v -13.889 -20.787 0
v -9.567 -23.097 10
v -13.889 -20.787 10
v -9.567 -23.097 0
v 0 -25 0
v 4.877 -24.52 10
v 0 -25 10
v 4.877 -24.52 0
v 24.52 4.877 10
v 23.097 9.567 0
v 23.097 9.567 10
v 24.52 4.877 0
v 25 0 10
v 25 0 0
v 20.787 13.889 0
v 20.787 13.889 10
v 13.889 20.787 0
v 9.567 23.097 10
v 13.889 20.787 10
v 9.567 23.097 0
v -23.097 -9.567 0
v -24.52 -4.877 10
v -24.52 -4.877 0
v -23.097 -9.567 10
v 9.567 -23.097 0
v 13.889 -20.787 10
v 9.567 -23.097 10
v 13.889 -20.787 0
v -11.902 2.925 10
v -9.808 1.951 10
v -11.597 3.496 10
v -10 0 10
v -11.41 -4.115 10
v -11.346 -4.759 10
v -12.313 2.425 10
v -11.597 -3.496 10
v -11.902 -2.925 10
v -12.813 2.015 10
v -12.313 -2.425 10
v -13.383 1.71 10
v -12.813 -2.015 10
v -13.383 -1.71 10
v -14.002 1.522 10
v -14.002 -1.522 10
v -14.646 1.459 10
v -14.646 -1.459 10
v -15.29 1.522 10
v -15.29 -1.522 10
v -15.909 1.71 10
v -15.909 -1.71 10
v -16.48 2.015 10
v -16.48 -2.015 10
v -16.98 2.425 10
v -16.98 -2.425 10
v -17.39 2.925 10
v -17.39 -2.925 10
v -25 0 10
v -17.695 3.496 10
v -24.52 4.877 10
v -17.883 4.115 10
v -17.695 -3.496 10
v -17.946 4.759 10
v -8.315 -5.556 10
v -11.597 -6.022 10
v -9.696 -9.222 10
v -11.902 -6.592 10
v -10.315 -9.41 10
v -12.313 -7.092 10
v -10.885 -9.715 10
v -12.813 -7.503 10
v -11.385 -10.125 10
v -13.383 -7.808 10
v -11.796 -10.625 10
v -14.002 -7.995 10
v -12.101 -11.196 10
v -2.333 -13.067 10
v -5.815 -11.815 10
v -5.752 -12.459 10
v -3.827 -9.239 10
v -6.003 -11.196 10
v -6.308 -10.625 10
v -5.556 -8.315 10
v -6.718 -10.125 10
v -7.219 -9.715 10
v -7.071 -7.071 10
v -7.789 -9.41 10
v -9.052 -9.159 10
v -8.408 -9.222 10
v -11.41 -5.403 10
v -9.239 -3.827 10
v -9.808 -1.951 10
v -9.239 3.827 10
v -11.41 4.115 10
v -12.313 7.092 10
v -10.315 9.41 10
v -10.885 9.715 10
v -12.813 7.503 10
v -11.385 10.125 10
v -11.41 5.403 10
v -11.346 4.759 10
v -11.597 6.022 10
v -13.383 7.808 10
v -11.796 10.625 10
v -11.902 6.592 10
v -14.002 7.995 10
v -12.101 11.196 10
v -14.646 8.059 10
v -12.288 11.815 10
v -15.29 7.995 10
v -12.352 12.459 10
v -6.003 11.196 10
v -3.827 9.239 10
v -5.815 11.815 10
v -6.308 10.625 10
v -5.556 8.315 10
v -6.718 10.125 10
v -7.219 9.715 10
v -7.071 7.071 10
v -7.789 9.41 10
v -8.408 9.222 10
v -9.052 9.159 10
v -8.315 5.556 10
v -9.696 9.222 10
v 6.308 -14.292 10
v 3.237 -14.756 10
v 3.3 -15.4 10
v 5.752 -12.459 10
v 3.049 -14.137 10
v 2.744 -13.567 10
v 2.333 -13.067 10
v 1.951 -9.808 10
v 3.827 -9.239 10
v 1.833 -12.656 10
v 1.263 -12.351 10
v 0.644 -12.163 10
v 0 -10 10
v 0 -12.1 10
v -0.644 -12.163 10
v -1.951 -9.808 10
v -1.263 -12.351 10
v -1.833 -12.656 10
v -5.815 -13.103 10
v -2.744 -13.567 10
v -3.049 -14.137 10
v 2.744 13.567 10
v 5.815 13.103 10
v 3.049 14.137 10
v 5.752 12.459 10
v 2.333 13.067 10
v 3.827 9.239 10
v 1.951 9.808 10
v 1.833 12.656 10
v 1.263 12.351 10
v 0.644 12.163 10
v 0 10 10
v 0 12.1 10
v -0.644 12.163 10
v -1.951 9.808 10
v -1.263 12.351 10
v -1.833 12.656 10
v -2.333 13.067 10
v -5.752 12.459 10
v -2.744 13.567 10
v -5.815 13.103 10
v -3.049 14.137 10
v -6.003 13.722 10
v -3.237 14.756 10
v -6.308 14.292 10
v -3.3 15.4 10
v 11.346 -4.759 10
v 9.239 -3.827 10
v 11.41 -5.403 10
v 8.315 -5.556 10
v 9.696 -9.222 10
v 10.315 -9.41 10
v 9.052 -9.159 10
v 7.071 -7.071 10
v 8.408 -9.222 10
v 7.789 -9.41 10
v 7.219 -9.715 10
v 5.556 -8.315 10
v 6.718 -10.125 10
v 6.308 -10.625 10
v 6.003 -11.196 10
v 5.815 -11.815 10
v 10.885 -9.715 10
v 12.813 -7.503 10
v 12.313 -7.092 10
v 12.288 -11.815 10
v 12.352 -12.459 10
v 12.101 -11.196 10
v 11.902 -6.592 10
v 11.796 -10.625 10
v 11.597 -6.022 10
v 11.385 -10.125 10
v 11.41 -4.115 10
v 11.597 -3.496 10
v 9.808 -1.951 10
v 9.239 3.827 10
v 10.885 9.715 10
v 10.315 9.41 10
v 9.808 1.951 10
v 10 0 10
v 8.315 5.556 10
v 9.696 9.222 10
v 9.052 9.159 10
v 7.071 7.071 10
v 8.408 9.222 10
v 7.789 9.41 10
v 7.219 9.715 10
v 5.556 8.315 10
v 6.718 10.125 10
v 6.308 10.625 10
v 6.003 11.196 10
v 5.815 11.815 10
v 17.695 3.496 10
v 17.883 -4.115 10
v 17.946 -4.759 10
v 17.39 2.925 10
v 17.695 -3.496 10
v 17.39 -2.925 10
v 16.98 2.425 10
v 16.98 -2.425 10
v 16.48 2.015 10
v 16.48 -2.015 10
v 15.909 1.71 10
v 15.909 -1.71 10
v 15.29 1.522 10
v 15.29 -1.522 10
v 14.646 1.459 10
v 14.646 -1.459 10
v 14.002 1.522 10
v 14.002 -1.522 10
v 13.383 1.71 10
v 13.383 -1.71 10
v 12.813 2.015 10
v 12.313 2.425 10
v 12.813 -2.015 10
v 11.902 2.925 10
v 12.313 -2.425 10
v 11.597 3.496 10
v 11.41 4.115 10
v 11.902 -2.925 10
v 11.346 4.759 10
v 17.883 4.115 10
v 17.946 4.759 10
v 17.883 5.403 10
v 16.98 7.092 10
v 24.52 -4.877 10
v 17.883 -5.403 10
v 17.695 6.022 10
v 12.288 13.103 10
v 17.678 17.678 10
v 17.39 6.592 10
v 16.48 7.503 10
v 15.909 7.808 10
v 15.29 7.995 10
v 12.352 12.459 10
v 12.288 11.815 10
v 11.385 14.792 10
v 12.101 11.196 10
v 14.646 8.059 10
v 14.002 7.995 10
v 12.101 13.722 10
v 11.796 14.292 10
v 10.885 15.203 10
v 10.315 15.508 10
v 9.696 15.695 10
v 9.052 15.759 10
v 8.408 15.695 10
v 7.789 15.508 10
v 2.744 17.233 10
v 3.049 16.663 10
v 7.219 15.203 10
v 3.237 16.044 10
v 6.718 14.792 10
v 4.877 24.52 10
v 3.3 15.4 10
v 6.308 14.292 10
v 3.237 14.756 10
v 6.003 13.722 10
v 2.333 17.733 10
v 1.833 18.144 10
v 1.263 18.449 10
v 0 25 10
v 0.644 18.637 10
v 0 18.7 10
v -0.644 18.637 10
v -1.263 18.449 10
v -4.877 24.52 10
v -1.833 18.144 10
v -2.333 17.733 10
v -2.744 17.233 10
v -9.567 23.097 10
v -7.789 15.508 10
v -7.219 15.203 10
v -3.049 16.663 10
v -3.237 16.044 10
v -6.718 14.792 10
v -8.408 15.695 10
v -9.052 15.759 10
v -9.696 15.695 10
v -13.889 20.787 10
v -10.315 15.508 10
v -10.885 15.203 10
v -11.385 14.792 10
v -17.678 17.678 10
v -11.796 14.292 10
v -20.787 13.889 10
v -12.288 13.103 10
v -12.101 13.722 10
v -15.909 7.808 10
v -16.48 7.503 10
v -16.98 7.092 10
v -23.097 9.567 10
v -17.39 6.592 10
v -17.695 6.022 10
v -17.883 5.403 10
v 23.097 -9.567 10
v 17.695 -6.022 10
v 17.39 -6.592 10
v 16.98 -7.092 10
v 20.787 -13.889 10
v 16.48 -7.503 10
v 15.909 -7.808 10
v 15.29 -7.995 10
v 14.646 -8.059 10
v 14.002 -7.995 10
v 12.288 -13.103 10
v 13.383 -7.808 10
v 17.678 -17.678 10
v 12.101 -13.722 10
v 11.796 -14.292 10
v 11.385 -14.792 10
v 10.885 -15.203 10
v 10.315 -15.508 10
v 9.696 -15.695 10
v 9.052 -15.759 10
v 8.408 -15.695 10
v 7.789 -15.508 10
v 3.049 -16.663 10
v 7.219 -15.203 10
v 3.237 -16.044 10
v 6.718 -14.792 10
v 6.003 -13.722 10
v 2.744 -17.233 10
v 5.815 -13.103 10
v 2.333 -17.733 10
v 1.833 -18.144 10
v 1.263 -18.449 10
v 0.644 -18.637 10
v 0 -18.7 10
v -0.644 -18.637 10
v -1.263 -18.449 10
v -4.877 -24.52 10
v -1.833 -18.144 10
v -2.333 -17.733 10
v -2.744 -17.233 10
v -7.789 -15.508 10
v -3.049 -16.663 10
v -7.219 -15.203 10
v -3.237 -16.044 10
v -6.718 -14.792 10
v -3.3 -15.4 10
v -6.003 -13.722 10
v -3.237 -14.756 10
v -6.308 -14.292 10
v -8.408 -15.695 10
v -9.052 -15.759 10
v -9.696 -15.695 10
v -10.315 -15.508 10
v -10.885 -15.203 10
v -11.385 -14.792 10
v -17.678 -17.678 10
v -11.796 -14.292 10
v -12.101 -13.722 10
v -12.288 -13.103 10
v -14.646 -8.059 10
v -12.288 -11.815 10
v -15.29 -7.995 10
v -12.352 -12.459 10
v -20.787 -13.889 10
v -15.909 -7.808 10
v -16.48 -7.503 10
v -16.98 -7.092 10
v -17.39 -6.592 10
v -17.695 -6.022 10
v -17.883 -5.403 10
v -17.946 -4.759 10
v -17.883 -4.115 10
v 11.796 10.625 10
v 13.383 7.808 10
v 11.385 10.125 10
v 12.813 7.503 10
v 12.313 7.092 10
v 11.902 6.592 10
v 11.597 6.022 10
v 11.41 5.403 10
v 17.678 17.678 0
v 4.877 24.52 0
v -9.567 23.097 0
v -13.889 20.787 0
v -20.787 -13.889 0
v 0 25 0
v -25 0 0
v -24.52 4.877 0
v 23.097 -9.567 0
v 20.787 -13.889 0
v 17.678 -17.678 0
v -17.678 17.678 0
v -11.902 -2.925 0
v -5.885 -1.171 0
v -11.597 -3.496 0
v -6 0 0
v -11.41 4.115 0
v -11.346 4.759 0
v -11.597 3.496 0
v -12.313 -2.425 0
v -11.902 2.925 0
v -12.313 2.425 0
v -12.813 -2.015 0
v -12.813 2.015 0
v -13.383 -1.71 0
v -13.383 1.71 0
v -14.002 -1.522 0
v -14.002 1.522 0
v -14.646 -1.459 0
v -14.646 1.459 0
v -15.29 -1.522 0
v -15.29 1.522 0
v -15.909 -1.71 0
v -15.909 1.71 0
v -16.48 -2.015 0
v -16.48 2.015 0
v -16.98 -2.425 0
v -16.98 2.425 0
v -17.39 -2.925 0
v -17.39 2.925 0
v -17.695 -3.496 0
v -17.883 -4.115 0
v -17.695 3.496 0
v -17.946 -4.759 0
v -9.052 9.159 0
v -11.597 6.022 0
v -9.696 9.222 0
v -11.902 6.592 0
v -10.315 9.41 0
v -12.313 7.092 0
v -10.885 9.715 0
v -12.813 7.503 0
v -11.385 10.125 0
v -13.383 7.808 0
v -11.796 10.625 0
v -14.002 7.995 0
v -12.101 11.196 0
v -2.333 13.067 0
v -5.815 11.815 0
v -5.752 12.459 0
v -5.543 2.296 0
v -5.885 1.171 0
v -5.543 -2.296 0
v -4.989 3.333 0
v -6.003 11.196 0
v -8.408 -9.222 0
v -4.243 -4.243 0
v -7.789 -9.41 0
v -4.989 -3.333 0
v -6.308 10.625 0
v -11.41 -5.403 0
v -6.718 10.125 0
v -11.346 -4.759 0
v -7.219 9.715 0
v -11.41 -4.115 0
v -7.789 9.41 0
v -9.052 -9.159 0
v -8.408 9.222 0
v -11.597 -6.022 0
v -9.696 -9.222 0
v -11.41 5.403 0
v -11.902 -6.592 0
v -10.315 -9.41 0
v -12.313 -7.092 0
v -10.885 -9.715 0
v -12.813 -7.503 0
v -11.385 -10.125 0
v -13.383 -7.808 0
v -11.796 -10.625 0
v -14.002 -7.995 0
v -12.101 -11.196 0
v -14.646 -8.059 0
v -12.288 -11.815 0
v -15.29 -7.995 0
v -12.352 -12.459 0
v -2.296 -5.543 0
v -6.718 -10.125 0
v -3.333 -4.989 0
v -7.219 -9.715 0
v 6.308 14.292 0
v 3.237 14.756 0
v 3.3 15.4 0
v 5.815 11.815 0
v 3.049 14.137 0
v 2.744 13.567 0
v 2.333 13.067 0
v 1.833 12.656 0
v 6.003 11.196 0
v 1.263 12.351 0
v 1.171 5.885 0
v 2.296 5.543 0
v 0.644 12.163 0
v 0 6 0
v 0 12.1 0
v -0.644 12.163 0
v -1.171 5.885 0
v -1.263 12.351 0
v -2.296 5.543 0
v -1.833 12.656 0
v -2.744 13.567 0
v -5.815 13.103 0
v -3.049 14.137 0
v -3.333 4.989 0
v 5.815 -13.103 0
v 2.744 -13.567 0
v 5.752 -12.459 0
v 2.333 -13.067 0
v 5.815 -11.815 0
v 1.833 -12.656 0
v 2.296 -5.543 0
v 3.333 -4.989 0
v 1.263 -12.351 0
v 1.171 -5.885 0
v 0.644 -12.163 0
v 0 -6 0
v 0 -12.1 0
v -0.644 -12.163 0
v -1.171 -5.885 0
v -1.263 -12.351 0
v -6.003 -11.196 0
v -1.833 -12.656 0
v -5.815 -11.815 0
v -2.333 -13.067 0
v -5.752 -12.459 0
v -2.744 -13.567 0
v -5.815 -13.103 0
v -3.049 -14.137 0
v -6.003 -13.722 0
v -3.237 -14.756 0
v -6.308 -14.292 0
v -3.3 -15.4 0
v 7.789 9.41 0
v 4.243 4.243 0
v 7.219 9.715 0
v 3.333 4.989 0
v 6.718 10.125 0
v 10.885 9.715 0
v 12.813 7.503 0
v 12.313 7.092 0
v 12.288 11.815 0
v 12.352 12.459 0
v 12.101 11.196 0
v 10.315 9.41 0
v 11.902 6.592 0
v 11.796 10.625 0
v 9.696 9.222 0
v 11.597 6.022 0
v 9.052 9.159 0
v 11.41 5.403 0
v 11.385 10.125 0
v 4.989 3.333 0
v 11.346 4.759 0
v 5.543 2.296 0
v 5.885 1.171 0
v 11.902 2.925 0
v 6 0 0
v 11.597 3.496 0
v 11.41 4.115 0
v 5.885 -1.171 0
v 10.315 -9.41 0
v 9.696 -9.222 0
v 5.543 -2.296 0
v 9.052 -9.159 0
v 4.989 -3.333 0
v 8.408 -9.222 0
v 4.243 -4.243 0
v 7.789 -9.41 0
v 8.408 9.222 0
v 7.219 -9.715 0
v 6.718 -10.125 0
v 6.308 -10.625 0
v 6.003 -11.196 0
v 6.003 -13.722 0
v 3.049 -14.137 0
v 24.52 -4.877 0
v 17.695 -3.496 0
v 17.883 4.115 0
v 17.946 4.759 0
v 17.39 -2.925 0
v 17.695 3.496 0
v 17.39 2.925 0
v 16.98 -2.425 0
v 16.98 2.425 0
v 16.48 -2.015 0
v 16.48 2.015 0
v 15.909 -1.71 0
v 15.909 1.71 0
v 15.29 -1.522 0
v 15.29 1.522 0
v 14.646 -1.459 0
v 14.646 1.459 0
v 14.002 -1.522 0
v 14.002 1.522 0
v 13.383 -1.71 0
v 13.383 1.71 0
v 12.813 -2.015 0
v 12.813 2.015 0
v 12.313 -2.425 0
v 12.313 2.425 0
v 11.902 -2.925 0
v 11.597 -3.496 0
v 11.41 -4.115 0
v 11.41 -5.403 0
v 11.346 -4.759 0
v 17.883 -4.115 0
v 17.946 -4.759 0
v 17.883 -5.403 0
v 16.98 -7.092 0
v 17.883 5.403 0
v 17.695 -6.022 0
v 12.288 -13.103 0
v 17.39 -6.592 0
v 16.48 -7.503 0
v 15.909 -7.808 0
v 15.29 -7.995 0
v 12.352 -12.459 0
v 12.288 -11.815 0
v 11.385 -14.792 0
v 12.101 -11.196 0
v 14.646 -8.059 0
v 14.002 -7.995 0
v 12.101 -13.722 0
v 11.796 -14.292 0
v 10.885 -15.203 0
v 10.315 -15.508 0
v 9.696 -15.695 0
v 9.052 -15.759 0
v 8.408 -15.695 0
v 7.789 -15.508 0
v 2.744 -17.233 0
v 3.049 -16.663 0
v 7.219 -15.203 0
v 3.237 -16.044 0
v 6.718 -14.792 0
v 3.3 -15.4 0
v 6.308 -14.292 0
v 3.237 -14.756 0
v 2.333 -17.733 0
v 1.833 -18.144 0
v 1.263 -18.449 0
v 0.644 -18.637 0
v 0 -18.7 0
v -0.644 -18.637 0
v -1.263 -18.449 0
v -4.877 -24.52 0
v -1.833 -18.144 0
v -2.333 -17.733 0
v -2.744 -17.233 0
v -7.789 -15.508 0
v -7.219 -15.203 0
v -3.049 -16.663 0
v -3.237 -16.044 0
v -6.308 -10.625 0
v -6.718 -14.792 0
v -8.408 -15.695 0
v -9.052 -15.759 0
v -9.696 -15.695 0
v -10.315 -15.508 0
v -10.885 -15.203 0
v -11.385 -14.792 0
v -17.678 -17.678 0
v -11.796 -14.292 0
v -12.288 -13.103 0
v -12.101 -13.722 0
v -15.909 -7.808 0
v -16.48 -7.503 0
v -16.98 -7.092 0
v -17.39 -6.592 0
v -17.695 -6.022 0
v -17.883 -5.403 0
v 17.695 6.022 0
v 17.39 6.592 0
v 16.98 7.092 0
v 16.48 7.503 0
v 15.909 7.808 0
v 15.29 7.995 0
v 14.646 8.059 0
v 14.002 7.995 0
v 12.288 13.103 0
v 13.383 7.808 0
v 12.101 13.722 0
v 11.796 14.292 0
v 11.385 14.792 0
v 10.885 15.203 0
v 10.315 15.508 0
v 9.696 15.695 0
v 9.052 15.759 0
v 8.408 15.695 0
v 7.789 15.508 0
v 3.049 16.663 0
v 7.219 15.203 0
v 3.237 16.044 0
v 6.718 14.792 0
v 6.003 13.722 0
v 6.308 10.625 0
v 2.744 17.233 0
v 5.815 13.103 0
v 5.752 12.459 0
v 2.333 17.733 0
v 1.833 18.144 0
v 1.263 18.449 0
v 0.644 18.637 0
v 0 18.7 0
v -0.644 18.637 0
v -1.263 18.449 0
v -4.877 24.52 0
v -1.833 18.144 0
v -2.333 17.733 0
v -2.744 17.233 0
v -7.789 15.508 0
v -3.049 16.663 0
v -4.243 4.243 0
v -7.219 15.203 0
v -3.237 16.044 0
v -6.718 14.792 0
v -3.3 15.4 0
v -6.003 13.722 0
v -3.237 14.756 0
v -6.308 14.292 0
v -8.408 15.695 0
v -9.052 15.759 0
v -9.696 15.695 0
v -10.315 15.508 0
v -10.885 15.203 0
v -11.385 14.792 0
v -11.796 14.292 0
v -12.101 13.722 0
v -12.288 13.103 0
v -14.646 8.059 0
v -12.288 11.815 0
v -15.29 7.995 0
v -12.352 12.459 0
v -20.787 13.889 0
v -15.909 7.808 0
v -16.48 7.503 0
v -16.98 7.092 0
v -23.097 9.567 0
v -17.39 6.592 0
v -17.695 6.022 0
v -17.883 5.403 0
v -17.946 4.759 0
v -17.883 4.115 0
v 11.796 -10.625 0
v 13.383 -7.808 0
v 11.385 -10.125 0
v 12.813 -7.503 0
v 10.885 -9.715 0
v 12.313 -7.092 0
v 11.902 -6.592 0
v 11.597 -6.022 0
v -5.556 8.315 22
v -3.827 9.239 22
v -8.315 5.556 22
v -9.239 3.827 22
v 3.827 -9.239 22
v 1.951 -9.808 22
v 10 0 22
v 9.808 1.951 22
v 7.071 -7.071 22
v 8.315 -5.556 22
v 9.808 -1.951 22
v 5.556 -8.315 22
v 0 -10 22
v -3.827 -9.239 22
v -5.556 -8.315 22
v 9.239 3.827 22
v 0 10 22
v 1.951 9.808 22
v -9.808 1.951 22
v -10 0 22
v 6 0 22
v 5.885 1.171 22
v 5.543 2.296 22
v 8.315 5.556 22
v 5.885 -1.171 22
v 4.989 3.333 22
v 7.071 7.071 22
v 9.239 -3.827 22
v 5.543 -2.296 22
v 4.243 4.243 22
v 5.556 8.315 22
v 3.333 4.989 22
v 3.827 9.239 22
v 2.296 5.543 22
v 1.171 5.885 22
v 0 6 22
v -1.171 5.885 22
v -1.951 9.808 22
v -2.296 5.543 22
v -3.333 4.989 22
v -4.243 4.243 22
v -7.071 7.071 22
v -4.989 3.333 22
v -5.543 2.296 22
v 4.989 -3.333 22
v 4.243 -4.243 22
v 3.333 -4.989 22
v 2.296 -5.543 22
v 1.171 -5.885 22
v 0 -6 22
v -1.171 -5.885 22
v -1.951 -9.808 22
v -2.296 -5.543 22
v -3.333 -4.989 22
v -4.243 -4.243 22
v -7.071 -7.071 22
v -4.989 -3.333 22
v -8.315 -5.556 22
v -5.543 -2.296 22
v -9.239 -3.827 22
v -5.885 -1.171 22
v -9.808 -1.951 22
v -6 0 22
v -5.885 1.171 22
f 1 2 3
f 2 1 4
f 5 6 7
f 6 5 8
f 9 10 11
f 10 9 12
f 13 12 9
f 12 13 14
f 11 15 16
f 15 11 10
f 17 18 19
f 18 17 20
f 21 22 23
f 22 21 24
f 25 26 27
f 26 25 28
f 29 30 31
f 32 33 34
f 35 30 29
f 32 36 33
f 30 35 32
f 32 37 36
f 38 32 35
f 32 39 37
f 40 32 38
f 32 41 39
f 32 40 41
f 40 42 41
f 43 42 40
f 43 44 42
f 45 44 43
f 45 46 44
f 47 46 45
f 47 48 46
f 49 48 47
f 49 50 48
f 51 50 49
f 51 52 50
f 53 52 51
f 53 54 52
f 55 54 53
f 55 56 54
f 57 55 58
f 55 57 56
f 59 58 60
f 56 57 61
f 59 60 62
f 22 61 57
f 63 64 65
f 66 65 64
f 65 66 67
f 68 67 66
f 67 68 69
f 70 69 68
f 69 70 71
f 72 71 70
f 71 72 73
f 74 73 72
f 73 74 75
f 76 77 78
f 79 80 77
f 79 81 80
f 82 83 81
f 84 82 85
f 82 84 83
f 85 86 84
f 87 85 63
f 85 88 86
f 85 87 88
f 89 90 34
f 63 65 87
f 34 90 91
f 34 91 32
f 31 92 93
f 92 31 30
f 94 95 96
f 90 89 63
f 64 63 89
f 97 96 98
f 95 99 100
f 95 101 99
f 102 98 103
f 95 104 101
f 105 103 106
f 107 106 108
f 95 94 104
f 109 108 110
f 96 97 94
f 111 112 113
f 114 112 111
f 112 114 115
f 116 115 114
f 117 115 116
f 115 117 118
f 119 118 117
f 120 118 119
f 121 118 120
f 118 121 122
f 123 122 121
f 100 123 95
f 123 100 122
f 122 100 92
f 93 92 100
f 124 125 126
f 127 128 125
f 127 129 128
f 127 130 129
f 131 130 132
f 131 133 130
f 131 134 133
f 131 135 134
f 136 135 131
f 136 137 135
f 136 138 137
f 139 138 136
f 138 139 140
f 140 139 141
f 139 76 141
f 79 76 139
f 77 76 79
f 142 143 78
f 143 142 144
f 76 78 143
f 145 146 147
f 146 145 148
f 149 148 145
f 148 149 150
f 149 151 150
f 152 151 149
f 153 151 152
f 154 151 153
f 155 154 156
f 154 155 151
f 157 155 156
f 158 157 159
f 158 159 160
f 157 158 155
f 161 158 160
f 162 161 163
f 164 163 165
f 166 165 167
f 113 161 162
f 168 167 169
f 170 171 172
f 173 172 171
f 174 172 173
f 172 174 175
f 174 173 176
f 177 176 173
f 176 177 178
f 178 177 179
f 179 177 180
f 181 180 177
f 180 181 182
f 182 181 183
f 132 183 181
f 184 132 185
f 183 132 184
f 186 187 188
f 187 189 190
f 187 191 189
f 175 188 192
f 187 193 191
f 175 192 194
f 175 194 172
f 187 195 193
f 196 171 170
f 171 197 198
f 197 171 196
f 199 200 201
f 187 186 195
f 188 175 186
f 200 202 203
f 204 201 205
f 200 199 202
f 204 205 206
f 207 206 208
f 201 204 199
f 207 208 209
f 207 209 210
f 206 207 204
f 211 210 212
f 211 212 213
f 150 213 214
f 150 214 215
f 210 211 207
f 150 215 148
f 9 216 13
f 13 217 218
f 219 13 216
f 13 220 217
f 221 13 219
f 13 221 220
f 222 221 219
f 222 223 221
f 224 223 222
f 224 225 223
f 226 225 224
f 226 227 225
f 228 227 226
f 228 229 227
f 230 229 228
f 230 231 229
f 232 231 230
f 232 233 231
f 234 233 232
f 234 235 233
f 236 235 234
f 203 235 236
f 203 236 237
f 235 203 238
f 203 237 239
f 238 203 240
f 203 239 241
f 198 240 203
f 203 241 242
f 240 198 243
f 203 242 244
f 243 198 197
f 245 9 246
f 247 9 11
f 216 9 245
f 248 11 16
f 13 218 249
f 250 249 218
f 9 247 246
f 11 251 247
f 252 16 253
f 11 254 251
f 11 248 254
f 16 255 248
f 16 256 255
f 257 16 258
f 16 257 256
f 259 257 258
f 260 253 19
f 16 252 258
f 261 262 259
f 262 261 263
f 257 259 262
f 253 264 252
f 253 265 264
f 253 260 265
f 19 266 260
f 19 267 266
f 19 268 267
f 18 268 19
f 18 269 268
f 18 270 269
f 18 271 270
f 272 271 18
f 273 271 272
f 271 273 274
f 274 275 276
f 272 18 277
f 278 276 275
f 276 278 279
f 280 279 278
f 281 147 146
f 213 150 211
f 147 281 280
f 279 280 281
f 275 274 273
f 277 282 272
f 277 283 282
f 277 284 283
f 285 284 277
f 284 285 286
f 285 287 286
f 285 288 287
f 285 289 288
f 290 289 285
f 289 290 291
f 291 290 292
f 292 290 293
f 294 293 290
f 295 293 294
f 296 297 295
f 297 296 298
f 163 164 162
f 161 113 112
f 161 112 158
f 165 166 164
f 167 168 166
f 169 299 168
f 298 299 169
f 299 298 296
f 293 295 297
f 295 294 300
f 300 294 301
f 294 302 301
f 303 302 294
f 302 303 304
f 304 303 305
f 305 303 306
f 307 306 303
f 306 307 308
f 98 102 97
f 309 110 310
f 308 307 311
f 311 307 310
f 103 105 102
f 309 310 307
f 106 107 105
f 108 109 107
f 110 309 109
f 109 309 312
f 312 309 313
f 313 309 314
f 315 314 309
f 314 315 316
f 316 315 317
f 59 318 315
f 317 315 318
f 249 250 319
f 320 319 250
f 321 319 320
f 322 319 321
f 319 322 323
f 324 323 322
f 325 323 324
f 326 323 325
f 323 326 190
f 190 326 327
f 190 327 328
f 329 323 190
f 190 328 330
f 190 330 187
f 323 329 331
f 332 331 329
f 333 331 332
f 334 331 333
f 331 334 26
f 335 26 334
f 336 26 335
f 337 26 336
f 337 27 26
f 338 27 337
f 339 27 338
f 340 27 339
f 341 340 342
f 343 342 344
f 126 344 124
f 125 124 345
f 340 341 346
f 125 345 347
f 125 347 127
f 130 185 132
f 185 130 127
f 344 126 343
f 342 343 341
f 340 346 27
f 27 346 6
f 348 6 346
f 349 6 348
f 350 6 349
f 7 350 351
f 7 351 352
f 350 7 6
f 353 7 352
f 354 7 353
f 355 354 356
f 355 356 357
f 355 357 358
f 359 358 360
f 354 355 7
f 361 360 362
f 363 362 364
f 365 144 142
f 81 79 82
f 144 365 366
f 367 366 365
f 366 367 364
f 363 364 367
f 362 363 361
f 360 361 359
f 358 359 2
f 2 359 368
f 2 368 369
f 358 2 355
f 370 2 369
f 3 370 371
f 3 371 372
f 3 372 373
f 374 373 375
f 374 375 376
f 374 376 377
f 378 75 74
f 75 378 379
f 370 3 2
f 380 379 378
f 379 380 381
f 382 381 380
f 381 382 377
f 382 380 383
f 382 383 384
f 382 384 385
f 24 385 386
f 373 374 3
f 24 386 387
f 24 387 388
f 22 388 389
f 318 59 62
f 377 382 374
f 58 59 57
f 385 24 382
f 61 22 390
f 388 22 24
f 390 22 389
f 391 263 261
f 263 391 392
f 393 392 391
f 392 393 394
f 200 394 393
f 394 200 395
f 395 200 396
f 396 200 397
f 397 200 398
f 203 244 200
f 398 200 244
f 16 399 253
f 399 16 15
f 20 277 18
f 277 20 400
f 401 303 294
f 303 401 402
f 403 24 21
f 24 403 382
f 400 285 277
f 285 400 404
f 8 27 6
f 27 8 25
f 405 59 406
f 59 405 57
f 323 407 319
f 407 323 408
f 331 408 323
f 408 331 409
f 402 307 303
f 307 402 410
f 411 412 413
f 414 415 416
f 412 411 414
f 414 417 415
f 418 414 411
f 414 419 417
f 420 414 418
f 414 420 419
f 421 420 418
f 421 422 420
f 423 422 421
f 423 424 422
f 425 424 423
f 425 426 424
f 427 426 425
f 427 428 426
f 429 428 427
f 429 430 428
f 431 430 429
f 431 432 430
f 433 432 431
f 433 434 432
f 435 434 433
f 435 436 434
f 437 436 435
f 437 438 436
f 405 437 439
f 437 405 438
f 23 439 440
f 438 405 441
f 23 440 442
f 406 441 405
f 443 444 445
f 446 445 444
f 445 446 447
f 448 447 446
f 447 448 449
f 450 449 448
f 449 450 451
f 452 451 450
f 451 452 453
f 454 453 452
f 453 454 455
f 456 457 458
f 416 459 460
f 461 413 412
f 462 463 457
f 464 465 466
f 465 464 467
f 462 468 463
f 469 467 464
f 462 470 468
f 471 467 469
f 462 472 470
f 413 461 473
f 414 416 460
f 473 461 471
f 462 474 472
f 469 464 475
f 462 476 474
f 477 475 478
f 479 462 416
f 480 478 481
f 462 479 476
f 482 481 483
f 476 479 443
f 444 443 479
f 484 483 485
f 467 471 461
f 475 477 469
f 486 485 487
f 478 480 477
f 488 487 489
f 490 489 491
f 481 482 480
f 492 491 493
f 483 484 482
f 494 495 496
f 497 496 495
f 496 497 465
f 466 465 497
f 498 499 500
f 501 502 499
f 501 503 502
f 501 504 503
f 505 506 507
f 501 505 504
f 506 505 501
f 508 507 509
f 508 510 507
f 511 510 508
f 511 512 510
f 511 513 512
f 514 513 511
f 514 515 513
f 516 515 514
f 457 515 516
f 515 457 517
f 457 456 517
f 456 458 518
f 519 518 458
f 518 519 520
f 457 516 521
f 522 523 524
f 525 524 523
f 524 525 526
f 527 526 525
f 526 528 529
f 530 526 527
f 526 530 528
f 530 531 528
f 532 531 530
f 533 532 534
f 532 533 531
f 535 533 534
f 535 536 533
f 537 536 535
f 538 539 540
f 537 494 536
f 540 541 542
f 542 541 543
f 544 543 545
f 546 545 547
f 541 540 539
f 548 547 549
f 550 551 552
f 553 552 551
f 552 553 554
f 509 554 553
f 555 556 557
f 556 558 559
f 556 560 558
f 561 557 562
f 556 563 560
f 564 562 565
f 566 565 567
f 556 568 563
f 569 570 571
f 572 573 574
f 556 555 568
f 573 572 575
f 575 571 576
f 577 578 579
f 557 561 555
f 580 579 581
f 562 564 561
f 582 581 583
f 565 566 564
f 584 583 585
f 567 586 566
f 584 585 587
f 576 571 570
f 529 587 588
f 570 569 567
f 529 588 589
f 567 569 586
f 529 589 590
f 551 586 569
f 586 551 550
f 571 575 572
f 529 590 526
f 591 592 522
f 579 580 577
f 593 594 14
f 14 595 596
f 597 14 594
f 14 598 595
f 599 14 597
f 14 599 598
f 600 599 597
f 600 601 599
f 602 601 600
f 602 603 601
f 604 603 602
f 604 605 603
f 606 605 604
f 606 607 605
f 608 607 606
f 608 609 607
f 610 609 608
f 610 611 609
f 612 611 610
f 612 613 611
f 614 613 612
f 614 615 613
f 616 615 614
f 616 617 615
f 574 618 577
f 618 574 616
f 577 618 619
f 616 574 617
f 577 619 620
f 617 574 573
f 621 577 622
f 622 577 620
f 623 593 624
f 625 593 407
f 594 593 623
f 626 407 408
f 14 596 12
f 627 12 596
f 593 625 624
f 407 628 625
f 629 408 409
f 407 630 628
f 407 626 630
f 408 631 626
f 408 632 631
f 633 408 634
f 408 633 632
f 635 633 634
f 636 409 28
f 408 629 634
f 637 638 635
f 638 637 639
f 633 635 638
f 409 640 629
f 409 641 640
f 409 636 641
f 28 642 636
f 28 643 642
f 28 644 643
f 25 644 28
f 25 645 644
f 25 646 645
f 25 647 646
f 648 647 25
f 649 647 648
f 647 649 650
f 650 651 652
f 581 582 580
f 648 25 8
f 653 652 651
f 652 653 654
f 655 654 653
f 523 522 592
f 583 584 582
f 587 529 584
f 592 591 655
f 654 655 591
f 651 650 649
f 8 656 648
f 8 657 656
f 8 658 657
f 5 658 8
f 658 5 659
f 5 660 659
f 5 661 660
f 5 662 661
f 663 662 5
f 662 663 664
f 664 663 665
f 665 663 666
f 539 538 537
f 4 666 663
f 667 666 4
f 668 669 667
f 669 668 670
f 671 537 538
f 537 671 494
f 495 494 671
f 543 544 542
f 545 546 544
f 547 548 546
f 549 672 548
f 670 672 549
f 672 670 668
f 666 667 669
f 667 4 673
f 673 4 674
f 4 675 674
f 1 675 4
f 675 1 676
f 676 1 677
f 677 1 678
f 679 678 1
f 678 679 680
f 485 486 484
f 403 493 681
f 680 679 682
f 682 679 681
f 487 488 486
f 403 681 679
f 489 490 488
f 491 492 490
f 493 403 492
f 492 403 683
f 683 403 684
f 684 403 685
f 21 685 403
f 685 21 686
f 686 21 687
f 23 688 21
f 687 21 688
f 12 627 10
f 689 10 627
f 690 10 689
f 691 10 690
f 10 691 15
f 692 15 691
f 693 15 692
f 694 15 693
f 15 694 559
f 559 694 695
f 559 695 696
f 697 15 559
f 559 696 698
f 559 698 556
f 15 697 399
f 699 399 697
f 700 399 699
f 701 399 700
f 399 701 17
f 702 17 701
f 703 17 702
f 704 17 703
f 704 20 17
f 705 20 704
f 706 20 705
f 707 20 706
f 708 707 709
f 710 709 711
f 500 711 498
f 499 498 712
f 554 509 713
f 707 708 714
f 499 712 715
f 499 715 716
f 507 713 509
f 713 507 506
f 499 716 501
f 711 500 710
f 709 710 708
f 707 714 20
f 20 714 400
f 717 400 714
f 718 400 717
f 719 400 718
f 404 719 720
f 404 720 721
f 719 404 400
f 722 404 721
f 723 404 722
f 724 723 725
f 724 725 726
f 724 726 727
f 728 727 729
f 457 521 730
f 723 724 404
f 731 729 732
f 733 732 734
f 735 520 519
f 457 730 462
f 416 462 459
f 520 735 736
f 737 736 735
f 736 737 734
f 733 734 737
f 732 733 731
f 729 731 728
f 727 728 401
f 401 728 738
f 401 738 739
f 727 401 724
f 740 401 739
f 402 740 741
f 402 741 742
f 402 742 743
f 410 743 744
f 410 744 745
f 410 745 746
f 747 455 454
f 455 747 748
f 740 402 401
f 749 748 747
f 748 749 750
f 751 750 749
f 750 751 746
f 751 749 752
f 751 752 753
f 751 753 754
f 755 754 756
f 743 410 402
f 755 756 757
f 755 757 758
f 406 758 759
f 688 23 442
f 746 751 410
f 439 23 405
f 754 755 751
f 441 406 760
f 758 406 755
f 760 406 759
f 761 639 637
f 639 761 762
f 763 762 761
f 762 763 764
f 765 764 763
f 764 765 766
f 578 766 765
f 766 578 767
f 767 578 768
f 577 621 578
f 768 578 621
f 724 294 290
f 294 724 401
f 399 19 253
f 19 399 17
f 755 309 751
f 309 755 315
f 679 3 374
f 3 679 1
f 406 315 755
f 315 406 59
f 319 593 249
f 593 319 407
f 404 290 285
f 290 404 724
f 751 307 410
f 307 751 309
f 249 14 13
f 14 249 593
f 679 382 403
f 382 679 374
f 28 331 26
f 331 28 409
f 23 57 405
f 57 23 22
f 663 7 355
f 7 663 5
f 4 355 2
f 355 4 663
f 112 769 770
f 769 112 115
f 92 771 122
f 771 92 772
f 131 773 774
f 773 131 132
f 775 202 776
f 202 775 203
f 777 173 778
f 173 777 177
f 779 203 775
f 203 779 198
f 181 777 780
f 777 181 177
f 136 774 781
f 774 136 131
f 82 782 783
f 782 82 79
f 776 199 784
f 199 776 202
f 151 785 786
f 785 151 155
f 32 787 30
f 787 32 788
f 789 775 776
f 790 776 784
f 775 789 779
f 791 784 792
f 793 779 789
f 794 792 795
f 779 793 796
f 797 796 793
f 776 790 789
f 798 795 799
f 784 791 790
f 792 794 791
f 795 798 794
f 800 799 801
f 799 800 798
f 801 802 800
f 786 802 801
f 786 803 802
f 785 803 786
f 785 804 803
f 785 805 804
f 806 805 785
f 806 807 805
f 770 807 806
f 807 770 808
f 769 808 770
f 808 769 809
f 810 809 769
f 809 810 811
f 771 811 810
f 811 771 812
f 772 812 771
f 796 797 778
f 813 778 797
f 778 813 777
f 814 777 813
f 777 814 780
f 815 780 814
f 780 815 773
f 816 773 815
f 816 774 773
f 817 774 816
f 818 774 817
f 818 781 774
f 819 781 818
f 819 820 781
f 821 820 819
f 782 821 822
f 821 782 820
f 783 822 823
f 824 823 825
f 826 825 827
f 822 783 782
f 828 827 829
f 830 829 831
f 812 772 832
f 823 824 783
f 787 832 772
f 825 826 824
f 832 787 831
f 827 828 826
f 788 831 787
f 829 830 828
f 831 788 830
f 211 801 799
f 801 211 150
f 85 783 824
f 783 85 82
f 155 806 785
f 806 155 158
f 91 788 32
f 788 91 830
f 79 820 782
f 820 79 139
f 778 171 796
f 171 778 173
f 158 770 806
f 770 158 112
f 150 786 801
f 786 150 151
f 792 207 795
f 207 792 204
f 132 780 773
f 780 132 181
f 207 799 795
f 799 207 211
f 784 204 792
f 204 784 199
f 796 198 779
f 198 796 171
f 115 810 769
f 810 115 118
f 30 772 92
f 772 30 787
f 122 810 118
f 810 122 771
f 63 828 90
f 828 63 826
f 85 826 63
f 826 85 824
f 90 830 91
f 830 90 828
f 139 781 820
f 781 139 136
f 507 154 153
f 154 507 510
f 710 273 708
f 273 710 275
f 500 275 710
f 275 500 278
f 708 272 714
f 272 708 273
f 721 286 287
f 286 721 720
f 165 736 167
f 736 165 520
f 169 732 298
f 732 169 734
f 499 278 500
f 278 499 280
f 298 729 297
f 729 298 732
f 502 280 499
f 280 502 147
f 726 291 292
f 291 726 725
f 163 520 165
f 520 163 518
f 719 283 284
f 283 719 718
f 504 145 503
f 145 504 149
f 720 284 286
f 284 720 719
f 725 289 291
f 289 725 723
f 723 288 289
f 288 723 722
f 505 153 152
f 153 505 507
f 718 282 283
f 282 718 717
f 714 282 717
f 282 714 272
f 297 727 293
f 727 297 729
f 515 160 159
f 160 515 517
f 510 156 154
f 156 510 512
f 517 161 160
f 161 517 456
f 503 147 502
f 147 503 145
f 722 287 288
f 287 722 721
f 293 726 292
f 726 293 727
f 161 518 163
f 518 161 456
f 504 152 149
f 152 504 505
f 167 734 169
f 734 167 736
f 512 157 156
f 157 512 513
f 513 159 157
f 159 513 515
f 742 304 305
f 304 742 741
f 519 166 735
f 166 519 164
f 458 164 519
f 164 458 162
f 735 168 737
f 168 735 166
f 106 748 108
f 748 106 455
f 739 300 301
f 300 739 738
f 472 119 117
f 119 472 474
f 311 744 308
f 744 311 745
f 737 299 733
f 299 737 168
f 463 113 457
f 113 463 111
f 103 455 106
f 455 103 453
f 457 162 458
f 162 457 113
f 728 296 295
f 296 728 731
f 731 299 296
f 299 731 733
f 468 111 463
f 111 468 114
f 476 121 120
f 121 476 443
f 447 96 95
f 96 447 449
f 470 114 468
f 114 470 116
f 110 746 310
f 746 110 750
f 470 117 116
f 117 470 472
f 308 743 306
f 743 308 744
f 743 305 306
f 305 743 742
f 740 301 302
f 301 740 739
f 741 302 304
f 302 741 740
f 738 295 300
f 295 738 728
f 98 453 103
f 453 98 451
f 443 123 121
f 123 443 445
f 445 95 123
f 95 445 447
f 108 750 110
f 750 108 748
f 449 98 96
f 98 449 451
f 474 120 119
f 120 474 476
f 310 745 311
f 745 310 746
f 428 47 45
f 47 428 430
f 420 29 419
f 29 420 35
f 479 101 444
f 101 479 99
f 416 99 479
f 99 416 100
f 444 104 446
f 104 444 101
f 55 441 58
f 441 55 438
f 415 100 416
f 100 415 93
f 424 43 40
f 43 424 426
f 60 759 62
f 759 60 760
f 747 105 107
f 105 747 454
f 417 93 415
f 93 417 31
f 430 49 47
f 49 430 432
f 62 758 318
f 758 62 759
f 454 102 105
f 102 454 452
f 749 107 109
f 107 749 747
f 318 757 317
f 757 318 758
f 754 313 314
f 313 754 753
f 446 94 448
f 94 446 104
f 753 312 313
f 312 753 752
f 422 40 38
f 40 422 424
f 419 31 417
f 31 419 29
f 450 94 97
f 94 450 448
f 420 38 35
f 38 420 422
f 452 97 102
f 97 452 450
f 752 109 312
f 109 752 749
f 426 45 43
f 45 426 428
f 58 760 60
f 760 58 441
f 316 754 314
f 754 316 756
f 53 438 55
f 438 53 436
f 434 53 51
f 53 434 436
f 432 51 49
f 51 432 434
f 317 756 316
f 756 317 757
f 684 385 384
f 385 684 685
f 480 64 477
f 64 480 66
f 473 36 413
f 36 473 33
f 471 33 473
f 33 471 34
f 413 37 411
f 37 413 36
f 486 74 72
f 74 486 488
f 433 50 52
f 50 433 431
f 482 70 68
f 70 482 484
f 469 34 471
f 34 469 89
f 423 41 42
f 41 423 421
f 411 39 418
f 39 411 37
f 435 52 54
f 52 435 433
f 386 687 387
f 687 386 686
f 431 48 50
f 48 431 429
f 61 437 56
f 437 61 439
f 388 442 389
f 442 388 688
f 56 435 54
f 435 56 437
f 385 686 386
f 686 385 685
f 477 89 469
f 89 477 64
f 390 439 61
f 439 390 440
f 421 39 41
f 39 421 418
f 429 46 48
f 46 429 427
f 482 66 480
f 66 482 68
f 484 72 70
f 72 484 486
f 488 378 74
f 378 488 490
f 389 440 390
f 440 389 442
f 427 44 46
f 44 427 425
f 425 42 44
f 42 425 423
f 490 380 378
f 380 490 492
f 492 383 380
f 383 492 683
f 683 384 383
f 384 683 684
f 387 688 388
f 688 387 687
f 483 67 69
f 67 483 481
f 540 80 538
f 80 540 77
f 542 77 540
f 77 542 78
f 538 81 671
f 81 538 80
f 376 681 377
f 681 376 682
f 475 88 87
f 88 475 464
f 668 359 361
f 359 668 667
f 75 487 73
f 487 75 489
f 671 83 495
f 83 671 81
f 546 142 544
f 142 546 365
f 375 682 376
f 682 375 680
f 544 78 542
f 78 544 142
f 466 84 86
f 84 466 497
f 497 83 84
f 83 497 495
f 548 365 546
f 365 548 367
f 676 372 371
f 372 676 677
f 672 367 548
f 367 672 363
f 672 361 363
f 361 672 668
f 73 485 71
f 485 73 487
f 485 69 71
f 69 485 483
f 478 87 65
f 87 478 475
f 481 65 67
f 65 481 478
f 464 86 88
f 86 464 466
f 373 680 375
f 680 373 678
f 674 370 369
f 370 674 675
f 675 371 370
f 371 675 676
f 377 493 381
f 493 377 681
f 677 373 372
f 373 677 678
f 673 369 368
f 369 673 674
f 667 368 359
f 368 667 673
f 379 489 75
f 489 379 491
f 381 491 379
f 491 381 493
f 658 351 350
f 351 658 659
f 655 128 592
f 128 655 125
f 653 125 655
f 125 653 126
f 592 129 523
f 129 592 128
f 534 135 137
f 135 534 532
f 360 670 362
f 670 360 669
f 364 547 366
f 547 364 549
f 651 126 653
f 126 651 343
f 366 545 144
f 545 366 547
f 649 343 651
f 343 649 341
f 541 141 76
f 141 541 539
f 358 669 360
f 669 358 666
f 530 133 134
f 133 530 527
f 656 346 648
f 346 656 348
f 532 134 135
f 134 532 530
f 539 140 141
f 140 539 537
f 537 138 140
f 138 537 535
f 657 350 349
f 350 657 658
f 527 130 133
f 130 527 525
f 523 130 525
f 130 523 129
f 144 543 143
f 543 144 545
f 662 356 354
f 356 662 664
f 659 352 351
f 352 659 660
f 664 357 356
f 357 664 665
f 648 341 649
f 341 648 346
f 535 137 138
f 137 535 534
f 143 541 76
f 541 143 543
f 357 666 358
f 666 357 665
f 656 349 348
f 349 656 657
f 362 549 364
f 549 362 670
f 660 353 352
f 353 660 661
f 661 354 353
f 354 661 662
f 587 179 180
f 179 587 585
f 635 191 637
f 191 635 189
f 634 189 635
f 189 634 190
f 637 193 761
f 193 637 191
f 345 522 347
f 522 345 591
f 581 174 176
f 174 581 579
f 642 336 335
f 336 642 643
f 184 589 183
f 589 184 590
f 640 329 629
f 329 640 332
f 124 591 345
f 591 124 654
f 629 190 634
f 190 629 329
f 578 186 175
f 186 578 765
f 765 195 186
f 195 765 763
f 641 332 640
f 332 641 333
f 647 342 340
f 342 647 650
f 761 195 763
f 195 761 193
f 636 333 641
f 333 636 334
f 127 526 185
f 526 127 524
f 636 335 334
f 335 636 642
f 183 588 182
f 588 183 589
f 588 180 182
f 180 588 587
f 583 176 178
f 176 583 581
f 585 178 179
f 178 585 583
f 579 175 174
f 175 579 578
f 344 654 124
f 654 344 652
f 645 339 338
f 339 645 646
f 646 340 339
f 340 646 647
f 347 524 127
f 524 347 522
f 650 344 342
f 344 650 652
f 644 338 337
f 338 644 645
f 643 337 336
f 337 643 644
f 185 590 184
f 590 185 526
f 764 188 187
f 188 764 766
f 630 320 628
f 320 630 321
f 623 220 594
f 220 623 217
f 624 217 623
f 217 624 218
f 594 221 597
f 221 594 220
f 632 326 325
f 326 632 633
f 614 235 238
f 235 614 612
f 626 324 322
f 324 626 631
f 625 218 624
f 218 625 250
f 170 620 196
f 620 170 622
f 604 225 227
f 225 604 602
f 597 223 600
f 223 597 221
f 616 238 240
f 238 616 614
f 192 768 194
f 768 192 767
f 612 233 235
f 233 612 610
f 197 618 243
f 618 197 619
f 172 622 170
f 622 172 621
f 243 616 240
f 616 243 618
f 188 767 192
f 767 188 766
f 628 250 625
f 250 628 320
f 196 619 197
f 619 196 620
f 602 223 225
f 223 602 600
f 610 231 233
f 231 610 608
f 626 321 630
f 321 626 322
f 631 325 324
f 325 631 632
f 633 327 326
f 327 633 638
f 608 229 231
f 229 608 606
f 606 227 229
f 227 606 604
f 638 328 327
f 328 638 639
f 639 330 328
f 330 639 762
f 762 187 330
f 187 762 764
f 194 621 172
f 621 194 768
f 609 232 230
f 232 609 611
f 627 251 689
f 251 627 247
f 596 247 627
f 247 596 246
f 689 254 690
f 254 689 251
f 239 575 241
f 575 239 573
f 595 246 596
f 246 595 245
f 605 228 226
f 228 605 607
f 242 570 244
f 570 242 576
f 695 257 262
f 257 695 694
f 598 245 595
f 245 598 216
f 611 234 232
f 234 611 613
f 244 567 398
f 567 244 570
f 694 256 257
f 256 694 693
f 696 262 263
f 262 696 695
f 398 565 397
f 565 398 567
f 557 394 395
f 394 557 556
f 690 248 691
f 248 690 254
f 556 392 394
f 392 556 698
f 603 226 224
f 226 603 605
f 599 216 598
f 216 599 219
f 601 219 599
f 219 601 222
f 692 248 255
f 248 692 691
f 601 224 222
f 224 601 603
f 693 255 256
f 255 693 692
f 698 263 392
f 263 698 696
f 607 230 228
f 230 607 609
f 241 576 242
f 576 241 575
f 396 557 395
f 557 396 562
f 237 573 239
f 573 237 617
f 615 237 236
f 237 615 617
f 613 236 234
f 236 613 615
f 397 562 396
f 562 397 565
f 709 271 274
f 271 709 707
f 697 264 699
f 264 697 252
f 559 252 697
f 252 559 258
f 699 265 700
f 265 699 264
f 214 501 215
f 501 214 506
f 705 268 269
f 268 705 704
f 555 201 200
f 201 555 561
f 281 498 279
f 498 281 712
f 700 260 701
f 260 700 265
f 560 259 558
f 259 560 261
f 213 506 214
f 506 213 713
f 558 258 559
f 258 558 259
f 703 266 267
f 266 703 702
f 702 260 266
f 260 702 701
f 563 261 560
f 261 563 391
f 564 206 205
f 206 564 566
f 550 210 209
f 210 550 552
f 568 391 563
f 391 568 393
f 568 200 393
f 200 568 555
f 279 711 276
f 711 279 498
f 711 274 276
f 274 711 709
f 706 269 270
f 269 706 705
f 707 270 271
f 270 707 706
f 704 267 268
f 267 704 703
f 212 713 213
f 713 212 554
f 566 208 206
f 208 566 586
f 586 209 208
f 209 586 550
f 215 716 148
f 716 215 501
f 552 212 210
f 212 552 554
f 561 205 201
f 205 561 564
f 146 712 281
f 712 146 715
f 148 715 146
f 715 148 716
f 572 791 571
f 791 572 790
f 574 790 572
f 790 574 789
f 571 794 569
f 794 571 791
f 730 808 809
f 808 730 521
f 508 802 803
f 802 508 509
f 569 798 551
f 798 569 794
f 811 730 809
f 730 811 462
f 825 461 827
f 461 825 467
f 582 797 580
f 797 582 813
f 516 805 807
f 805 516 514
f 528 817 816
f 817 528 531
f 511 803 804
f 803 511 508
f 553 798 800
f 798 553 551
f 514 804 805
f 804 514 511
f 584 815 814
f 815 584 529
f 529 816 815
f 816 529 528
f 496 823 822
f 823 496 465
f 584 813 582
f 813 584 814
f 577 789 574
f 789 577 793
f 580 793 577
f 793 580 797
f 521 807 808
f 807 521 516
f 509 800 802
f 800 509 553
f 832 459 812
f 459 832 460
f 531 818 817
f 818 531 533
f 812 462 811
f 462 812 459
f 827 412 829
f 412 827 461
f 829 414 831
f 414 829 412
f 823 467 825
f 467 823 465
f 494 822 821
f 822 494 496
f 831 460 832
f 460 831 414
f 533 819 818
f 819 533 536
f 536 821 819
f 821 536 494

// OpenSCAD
$fn = 32;

// ----------------------------------------------------------------------
// Flange Ø50 x 10
// 10 holes on a Ø30.8 bolt circle, bolted joints
// ----------------------------------------------------------------------

// --- parameters (mm) ---
flange_d = 50;   // outside diameter of the flange
thickness = 10;  // flange thickness
holes = 10;      // number of bolt holes
pcd = 30.8;      // bolt circle diameter
start_deg = 90;  // angle of the first hole, from +X
hole_d = 6.6;    // bolt hole diameter
bore_d = 12;     // central through bore
hub_d = 20;      // hub outside diameter
hub_h = 12;      // hub height above the flange face (0 = no hub)

// --- derived feature positions (mm) ---
height = thickness + hub_h;  // = 22   overall height of the part
pcd_r = pcd / 2;             // = 15.4   bolt circle radius
hole_step = 360 / holes;     // = 36   angular pitch
feature_centers = [
  [pcd_r * cos(start_deg + 0 * hole_step), pcd_r * sin(start_deg + 0 * hole_step)],
  [pcd_r * cos(start_deg + 1 * hole_step), pcd_r * sin(start_deg + 1 * hole_step)],
  [pcd_r * cos(start_deg + 2 * hole_step), pcd_r * sin(start_deg + 2 * hole_step)],
  [pcd_r * cos(start_deg + 3 * hole_step), pcd_r * sin(start_deg + 3 * hole_step)],
  [pcd_r * cos(start_deg + 4 * hole_step), pcd_r * sin(start_deg + 4 * hole_step)],
  [pcd_r * cos(start_deg + 5 * hole_step), pcd_r * sin(start_deg + 5 * hole_step)],
  [pcd_r * cos(start_deg + 6 * hole_step), pcd_r * sin(start_deg + 6 * hole_step)],
  [pcd_r * cos(start_deg + 7 * hole_step), pcd_r * sin(start_deg + 7 * hole_step)],
  [pcd_r * cos(start_deg + 8 * hole_step), pcd_r * sin(start_deg + 8 * hole_step)],
  [pcd_r * cos(start_deg + 9 * hole_step), pcd_r * sin(start_deg + 9 * hole_step)]
];   // bolt hole centres on the pitch circle

// flange disc, every hole and the bore cut straight through
difference() {
  union() {
    cylinder(d = flange_d, h = thickness);
    cylinder(d = hub_d, h = height);  // hub, overlapped into the flange
  }
  translate([0, 0, -1]) cylinder(d = bore_d, h = height + 2);  // bore, through
  for (centre = feature_centers)
    translate([centre[0], centre[1], -1]) cylinder(d = hole_d, h = thickness + 2);
}
